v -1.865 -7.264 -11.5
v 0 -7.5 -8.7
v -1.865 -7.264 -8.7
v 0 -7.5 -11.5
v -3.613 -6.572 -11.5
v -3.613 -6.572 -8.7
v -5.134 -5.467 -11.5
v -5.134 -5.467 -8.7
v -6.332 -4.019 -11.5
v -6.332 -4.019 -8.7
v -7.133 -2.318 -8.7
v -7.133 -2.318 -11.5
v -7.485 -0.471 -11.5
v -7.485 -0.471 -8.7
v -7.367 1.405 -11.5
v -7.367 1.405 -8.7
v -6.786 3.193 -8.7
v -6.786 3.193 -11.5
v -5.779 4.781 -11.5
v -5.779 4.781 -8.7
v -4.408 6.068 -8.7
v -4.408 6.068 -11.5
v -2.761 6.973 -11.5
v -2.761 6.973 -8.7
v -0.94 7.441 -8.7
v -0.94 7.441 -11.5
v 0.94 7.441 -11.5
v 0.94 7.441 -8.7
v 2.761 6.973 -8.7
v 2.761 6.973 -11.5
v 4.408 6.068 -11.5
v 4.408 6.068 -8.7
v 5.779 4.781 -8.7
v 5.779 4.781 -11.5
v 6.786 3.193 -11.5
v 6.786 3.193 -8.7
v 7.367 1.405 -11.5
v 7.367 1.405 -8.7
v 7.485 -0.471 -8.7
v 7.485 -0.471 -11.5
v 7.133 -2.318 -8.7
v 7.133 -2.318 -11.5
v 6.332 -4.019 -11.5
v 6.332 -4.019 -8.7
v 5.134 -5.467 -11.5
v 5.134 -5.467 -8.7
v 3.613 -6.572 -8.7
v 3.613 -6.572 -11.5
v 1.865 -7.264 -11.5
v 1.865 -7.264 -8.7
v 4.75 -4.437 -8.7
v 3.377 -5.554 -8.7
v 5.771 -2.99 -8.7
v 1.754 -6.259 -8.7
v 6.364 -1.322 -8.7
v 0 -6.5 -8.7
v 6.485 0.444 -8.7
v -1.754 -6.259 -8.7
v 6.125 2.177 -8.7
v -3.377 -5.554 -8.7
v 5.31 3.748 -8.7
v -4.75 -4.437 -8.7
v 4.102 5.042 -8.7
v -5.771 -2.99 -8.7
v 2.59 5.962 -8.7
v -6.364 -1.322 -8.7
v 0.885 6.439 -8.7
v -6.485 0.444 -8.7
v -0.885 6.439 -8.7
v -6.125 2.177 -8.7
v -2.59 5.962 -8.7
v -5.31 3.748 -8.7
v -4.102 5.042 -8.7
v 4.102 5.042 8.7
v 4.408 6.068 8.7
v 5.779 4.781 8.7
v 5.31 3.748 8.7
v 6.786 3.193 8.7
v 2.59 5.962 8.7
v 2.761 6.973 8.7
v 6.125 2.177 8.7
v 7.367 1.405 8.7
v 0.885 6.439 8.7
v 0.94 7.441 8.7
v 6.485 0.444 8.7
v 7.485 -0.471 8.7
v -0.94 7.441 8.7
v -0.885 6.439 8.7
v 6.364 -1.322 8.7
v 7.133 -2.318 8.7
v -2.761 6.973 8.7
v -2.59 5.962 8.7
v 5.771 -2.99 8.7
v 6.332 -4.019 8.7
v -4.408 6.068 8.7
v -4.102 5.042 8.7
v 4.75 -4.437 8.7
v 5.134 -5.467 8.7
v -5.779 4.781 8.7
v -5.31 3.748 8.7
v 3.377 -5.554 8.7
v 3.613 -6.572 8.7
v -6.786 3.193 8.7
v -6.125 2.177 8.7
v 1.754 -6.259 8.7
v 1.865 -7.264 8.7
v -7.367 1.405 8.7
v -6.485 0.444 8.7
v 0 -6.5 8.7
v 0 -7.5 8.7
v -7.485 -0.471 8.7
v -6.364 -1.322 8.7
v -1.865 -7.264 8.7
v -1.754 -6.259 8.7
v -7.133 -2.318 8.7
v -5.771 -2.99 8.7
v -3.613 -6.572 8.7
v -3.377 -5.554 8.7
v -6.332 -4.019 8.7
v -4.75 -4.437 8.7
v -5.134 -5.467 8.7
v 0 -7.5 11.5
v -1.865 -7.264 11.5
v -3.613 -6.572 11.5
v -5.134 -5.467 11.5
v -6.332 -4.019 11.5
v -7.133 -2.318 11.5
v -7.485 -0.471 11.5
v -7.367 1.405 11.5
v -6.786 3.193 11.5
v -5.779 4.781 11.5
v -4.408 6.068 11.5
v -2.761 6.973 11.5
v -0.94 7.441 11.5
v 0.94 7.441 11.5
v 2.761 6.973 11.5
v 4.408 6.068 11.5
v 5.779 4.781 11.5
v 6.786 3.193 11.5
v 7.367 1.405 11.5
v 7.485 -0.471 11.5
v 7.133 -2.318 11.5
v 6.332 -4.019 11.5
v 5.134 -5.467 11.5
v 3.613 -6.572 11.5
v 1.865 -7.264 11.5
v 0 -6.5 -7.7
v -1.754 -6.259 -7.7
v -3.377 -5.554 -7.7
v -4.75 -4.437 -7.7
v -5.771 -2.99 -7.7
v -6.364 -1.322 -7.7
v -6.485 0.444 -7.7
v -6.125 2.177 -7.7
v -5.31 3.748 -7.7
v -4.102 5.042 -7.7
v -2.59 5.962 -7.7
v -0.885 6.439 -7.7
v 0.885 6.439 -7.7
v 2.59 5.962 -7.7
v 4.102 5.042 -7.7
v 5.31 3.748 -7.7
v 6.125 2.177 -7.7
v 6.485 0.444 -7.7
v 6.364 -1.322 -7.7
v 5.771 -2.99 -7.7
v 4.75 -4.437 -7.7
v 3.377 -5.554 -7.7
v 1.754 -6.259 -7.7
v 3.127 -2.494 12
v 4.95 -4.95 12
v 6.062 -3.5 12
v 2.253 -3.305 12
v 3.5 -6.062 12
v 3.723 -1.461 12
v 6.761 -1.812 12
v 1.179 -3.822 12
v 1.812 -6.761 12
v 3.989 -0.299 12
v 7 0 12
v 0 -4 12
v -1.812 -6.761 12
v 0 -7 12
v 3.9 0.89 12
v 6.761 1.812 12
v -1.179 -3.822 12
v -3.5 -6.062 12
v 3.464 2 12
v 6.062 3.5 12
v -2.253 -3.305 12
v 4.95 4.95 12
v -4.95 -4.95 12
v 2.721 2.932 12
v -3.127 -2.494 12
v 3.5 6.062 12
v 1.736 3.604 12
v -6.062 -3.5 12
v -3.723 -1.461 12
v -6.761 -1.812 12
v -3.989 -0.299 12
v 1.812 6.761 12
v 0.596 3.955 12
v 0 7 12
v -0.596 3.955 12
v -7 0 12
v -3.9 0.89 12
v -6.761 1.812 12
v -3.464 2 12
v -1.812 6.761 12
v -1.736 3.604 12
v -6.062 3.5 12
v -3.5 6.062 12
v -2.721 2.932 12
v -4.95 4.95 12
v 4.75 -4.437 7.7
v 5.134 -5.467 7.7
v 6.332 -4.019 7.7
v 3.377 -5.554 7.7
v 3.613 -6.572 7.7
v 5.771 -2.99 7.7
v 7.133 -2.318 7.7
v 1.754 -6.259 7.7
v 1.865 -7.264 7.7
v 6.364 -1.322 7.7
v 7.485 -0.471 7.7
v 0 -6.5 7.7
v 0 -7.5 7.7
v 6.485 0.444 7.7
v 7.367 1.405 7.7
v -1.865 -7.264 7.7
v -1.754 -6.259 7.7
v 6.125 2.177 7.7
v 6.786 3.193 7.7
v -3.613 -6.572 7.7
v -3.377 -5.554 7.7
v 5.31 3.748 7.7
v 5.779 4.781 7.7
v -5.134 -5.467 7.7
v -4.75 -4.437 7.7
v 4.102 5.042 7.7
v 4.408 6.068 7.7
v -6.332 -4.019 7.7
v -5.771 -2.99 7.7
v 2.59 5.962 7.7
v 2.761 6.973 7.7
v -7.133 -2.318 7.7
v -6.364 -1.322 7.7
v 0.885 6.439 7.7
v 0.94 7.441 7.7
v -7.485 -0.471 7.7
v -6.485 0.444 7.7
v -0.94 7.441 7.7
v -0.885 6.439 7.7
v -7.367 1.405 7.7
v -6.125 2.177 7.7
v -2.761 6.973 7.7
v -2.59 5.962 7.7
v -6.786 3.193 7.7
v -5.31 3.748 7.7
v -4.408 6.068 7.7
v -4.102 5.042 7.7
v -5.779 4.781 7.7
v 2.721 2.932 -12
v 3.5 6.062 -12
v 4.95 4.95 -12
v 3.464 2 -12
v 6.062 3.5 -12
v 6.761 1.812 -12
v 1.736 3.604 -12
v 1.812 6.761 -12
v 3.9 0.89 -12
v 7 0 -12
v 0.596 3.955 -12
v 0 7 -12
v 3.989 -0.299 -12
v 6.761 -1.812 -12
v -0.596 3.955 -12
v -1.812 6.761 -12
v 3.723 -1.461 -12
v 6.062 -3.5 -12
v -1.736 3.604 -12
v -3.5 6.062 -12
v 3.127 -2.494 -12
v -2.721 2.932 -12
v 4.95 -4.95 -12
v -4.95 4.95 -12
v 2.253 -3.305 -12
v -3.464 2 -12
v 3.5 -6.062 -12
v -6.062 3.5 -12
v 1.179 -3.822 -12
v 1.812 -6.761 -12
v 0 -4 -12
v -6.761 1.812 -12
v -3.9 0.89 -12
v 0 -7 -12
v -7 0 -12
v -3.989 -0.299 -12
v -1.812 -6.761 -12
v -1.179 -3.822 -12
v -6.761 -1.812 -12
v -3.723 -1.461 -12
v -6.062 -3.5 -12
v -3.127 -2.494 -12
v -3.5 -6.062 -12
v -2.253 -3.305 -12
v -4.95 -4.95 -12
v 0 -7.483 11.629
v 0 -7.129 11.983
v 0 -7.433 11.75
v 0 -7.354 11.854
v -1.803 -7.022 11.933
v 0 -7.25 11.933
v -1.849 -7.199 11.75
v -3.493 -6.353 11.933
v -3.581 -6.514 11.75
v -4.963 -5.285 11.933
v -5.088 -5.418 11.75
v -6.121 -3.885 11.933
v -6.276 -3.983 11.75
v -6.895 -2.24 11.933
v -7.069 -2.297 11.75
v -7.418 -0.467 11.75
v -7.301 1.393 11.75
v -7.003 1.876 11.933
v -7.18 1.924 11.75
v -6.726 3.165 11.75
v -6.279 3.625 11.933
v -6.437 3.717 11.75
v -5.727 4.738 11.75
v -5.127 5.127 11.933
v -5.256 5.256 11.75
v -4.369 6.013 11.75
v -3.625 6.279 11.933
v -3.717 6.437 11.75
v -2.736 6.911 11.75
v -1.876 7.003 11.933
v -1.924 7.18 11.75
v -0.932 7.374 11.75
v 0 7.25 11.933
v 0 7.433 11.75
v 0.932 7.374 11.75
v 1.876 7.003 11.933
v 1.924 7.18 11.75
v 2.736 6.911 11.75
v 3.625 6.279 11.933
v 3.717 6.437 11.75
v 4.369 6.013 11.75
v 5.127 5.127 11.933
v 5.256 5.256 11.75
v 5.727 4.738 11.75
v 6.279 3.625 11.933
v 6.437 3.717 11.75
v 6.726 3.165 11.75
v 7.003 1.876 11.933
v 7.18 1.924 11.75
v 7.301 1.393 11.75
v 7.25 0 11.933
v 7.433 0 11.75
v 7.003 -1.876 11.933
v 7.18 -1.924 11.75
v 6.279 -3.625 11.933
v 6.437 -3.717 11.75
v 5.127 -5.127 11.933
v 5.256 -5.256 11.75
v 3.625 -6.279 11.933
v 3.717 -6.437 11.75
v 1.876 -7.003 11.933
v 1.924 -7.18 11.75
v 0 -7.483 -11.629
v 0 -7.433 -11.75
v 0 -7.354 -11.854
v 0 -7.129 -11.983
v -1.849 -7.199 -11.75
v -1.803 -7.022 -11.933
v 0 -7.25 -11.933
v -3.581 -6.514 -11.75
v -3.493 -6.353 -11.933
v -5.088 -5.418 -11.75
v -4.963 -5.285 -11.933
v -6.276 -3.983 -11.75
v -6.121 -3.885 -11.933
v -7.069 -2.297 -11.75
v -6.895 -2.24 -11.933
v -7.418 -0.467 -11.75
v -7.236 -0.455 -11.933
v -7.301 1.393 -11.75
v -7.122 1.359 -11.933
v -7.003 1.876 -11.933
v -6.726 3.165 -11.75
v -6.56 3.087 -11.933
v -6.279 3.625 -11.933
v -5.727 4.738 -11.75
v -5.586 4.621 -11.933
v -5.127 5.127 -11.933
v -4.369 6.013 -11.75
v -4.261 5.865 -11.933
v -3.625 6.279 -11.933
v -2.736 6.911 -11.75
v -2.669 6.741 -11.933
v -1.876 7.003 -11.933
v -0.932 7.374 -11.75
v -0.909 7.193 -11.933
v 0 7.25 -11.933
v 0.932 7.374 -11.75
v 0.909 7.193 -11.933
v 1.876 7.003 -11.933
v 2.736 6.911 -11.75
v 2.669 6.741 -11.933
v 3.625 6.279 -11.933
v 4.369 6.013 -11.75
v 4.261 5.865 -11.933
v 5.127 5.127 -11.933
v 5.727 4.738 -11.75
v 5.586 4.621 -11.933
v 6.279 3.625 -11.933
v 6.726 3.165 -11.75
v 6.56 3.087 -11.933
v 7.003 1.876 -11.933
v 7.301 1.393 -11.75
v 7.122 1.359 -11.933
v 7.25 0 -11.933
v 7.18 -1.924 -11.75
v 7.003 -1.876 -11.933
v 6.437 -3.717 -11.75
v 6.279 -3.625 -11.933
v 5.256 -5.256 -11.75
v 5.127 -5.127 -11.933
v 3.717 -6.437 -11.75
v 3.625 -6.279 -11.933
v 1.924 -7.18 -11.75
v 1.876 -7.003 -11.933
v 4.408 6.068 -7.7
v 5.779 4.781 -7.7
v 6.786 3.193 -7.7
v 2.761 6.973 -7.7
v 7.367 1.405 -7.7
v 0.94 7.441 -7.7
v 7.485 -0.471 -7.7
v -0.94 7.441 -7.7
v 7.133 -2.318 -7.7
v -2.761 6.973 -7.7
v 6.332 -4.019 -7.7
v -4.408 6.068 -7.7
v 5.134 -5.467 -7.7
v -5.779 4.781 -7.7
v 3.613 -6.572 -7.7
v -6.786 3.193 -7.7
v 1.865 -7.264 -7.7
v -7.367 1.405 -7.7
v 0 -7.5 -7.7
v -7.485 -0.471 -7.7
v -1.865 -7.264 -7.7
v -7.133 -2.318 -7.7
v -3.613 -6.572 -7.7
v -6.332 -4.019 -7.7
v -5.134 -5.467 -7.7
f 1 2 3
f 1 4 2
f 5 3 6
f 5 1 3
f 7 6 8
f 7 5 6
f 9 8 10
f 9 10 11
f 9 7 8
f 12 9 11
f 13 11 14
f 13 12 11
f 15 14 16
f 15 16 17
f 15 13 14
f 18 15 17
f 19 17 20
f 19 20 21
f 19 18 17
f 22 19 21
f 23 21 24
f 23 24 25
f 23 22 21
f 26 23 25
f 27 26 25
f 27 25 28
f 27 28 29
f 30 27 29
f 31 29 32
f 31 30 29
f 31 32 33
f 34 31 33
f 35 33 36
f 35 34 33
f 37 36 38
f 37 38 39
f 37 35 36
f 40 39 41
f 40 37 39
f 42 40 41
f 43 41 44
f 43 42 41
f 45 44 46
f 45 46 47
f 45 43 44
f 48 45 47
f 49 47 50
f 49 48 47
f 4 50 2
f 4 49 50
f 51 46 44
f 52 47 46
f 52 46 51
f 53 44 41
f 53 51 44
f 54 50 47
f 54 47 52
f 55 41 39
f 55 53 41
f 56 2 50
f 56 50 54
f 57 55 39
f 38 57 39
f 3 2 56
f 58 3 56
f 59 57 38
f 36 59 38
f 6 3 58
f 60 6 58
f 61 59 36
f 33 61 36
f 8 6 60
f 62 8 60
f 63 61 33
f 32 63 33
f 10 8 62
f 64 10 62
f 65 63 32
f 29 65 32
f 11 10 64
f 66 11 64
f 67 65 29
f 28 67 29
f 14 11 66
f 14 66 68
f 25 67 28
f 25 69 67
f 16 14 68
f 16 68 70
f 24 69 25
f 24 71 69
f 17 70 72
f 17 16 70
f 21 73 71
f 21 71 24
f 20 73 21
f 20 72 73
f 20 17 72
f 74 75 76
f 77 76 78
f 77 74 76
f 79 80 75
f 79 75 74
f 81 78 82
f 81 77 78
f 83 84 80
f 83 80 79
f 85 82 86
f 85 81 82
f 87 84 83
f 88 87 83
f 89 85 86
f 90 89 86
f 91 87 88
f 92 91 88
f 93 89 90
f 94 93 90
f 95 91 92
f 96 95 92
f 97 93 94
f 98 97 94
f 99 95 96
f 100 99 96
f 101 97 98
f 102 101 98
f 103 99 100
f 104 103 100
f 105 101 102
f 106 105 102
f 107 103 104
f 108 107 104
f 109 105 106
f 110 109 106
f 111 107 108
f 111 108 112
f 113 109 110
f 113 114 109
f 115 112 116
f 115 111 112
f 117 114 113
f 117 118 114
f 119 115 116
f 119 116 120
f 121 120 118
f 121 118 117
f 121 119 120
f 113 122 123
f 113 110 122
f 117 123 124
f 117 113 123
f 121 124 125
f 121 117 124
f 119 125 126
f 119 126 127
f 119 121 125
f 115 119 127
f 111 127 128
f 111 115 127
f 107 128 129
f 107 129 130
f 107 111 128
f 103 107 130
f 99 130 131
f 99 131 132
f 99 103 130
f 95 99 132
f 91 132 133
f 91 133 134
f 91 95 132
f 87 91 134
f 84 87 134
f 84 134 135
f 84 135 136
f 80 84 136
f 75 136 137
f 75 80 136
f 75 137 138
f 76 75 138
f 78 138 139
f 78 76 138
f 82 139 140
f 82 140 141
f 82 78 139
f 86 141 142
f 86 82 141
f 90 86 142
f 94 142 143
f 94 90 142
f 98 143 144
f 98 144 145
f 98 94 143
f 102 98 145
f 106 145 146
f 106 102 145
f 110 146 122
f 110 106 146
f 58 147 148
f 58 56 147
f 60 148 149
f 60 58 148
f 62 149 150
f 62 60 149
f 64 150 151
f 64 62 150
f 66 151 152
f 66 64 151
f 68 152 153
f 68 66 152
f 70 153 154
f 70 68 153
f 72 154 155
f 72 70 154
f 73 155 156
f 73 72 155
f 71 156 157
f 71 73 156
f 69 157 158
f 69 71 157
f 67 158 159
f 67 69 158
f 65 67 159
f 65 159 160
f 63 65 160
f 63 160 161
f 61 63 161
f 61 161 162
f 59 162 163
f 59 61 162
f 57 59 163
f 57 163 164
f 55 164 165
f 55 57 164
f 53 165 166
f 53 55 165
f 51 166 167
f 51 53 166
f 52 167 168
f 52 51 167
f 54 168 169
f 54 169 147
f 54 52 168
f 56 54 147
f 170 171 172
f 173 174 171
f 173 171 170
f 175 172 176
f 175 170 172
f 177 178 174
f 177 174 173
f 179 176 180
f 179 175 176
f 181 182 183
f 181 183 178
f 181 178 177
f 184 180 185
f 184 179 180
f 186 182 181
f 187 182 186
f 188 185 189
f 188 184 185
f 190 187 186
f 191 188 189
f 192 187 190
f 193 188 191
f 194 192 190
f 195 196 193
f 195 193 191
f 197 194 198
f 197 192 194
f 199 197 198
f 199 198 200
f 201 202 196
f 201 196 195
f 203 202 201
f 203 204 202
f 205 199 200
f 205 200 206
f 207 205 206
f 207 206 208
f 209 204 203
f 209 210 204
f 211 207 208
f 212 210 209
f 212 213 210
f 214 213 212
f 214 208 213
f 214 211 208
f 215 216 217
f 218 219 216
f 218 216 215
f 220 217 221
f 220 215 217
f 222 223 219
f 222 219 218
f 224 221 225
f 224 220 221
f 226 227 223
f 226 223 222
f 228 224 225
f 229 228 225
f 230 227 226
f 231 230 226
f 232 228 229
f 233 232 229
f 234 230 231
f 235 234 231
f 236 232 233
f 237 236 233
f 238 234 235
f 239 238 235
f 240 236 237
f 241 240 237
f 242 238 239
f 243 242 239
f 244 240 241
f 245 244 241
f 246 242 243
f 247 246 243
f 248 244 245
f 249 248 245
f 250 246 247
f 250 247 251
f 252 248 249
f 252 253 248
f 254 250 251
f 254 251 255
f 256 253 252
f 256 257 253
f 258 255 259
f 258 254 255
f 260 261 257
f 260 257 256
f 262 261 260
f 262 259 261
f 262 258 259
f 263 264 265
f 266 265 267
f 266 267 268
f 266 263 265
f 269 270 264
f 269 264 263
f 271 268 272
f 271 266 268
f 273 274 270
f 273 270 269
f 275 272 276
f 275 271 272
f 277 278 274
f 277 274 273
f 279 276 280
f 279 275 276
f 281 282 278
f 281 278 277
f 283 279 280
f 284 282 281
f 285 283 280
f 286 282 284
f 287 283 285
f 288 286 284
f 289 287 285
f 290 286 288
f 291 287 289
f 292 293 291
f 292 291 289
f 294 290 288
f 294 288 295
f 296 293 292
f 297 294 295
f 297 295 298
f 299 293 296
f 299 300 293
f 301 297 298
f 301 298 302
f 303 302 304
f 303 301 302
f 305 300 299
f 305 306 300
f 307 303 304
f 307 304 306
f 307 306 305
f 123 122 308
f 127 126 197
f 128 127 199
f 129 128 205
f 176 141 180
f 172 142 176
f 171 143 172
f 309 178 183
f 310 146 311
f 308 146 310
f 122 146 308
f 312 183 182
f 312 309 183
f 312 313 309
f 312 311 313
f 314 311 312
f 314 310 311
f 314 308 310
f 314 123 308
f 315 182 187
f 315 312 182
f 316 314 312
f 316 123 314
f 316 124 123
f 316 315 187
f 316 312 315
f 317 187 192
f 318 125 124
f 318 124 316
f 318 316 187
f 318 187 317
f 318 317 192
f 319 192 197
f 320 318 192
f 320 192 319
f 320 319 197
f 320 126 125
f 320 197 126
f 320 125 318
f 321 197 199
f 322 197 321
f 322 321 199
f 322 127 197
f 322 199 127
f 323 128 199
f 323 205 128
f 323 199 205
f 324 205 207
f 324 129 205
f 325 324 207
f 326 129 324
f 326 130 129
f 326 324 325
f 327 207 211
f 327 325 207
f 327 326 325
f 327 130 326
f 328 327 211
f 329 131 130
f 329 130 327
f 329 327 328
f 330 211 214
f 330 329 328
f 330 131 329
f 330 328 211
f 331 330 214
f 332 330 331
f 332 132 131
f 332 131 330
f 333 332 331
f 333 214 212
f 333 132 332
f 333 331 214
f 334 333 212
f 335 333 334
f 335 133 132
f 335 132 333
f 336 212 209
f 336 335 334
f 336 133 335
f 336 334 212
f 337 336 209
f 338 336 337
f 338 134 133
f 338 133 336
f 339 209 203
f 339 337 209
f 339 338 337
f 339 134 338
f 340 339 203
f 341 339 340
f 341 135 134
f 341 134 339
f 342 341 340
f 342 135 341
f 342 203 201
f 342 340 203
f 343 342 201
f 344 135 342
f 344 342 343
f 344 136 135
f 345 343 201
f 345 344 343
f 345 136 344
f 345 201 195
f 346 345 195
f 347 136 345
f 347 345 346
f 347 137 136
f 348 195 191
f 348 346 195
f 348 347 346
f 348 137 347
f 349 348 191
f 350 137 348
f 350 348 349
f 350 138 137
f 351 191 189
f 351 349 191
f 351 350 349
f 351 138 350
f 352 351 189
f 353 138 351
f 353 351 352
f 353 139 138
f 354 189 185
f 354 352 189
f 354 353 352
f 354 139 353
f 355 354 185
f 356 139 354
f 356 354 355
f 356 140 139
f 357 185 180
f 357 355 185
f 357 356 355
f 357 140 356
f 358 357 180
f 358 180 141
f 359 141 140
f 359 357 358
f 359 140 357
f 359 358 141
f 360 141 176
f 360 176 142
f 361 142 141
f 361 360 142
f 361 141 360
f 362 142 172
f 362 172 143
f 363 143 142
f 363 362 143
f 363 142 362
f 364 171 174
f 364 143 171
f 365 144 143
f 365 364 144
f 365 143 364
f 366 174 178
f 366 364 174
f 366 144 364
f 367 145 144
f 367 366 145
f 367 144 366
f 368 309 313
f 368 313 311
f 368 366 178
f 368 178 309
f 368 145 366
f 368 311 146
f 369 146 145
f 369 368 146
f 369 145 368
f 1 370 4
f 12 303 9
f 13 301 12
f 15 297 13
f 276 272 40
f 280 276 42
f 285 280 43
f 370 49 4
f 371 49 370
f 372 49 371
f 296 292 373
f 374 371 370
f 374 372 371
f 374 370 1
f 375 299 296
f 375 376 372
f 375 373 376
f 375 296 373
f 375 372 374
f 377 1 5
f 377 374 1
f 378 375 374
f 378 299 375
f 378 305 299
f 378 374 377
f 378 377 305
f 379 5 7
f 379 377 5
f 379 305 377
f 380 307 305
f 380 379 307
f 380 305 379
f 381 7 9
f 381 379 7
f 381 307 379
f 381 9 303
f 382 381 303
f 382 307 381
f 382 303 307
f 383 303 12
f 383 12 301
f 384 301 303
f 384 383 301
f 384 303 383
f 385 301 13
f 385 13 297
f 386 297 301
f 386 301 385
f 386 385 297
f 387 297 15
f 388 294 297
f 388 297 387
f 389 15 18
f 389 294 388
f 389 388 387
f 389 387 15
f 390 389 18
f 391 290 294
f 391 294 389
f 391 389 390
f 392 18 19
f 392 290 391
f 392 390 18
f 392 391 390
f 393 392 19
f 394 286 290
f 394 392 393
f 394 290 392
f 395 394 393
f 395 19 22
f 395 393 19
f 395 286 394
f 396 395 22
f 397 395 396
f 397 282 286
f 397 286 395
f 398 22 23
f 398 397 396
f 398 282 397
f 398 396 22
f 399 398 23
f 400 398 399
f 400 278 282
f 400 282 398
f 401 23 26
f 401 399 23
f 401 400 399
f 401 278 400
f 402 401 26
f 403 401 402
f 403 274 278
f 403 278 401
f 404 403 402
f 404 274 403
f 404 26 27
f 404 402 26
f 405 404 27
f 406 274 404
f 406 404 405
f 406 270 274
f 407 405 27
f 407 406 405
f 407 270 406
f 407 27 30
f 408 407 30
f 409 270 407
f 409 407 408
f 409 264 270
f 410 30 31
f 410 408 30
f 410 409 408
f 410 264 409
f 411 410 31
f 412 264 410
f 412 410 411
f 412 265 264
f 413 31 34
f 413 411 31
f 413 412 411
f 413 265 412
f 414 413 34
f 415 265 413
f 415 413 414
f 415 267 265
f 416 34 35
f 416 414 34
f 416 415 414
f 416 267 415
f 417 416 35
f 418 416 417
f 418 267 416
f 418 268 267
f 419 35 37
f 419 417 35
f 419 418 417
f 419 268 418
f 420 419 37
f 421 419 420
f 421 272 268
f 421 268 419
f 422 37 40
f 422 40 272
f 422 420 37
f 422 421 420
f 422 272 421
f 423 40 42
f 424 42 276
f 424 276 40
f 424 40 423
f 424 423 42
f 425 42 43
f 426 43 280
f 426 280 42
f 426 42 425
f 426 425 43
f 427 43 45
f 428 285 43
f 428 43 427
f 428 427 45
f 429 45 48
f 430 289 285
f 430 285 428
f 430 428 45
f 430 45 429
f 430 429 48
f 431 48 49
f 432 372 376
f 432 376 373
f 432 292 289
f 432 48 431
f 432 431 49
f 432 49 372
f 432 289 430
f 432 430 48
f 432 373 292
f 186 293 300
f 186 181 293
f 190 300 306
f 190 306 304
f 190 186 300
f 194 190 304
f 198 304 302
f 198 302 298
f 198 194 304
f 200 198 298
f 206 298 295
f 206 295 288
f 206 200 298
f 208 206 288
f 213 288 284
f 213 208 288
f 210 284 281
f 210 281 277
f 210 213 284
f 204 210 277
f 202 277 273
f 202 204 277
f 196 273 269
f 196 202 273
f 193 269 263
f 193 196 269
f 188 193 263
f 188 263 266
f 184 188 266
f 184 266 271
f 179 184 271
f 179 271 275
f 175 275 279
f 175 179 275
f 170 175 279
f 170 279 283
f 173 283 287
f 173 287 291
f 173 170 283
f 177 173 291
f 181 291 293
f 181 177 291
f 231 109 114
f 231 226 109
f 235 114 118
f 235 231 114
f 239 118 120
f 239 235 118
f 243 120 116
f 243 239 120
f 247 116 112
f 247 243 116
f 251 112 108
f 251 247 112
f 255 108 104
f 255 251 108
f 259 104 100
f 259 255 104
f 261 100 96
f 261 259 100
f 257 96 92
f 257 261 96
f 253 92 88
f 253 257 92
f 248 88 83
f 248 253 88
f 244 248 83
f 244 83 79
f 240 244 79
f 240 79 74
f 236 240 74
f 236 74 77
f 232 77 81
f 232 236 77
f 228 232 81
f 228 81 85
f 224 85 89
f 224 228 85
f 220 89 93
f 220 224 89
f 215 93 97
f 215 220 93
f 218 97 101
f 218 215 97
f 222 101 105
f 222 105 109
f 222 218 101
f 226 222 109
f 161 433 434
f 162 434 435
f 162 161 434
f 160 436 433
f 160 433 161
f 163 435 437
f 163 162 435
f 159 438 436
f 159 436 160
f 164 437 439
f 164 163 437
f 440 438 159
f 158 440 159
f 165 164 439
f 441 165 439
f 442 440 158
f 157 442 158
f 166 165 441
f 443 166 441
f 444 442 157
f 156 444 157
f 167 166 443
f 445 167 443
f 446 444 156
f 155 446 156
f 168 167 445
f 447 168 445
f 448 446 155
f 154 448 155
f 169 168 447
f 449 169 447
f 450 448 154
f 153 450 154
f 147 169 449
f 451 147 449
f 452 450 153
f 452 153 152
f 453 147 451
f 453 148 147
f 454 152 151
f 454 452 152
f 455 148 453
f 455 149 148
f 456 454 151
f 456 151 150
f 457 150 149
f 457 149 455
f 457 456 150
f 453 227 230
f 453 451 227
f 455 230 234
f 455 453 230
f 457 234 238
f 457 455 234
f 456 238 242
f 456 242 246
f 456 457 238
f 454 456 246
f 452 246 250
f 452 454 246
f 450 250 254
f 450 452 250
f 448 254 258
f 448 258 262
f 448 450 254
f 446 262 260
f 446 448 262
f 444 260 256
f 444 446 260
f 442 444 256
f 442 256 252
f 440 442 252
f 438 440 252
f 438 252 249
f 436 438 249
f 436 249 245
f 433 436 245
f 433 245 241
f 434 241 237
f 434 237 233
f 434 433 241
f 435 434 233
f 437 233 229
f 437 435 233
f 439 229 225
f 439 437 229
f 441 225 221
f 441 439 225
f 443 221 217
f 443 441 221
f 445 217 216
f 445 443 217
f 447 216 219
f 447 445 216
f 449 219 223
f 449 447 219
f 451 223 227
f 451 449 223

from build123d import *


with BuildPart() as part:
    # Эскиз2 → Повернуть1 (revolve)
    with BuildSketch(Plane(origin=(0, 0, 0), x_dir=(0, 0, -1), z_dir=(1, 0, 0))):
        with BuildLine():
            Line((7.7, -7.5), (7.7, -6.5))
            Line((7.7, -6.5), (8.7, -6.5))
            Line((8.7, -6.5), (8.7, -7.5))
            Line((8.7, -7.5), (11.5, -7.5))
            ThreePointArc((11.5, -7.5), (11.853553391, -7.353553391), (12, -7))
            Line((12, -7), (12, -4))
            Line((12, -4), (-12, -4))
            Line((-12, -4), (-12, -7))
            ThreePointArc((-12, -7), (-11.853553391, -7.353553391), (-11.5, -7.5))
            Line((-11.5, -7.5), (-8.7, -7.5))
            Line((-8.7, -7.5), (-8.7, -6.5))
            Line((-8.7, -6.5), (-7.7, -6.5))
            Line((-7.7, -6.5), (-7.7, -7.5))
            Line((-7.7, -7.5), (7.7, -7.5))
        make_face()
    revolve(axis=Axis((0, 0, 12), (0, 0, -1)))


solid = part.part
